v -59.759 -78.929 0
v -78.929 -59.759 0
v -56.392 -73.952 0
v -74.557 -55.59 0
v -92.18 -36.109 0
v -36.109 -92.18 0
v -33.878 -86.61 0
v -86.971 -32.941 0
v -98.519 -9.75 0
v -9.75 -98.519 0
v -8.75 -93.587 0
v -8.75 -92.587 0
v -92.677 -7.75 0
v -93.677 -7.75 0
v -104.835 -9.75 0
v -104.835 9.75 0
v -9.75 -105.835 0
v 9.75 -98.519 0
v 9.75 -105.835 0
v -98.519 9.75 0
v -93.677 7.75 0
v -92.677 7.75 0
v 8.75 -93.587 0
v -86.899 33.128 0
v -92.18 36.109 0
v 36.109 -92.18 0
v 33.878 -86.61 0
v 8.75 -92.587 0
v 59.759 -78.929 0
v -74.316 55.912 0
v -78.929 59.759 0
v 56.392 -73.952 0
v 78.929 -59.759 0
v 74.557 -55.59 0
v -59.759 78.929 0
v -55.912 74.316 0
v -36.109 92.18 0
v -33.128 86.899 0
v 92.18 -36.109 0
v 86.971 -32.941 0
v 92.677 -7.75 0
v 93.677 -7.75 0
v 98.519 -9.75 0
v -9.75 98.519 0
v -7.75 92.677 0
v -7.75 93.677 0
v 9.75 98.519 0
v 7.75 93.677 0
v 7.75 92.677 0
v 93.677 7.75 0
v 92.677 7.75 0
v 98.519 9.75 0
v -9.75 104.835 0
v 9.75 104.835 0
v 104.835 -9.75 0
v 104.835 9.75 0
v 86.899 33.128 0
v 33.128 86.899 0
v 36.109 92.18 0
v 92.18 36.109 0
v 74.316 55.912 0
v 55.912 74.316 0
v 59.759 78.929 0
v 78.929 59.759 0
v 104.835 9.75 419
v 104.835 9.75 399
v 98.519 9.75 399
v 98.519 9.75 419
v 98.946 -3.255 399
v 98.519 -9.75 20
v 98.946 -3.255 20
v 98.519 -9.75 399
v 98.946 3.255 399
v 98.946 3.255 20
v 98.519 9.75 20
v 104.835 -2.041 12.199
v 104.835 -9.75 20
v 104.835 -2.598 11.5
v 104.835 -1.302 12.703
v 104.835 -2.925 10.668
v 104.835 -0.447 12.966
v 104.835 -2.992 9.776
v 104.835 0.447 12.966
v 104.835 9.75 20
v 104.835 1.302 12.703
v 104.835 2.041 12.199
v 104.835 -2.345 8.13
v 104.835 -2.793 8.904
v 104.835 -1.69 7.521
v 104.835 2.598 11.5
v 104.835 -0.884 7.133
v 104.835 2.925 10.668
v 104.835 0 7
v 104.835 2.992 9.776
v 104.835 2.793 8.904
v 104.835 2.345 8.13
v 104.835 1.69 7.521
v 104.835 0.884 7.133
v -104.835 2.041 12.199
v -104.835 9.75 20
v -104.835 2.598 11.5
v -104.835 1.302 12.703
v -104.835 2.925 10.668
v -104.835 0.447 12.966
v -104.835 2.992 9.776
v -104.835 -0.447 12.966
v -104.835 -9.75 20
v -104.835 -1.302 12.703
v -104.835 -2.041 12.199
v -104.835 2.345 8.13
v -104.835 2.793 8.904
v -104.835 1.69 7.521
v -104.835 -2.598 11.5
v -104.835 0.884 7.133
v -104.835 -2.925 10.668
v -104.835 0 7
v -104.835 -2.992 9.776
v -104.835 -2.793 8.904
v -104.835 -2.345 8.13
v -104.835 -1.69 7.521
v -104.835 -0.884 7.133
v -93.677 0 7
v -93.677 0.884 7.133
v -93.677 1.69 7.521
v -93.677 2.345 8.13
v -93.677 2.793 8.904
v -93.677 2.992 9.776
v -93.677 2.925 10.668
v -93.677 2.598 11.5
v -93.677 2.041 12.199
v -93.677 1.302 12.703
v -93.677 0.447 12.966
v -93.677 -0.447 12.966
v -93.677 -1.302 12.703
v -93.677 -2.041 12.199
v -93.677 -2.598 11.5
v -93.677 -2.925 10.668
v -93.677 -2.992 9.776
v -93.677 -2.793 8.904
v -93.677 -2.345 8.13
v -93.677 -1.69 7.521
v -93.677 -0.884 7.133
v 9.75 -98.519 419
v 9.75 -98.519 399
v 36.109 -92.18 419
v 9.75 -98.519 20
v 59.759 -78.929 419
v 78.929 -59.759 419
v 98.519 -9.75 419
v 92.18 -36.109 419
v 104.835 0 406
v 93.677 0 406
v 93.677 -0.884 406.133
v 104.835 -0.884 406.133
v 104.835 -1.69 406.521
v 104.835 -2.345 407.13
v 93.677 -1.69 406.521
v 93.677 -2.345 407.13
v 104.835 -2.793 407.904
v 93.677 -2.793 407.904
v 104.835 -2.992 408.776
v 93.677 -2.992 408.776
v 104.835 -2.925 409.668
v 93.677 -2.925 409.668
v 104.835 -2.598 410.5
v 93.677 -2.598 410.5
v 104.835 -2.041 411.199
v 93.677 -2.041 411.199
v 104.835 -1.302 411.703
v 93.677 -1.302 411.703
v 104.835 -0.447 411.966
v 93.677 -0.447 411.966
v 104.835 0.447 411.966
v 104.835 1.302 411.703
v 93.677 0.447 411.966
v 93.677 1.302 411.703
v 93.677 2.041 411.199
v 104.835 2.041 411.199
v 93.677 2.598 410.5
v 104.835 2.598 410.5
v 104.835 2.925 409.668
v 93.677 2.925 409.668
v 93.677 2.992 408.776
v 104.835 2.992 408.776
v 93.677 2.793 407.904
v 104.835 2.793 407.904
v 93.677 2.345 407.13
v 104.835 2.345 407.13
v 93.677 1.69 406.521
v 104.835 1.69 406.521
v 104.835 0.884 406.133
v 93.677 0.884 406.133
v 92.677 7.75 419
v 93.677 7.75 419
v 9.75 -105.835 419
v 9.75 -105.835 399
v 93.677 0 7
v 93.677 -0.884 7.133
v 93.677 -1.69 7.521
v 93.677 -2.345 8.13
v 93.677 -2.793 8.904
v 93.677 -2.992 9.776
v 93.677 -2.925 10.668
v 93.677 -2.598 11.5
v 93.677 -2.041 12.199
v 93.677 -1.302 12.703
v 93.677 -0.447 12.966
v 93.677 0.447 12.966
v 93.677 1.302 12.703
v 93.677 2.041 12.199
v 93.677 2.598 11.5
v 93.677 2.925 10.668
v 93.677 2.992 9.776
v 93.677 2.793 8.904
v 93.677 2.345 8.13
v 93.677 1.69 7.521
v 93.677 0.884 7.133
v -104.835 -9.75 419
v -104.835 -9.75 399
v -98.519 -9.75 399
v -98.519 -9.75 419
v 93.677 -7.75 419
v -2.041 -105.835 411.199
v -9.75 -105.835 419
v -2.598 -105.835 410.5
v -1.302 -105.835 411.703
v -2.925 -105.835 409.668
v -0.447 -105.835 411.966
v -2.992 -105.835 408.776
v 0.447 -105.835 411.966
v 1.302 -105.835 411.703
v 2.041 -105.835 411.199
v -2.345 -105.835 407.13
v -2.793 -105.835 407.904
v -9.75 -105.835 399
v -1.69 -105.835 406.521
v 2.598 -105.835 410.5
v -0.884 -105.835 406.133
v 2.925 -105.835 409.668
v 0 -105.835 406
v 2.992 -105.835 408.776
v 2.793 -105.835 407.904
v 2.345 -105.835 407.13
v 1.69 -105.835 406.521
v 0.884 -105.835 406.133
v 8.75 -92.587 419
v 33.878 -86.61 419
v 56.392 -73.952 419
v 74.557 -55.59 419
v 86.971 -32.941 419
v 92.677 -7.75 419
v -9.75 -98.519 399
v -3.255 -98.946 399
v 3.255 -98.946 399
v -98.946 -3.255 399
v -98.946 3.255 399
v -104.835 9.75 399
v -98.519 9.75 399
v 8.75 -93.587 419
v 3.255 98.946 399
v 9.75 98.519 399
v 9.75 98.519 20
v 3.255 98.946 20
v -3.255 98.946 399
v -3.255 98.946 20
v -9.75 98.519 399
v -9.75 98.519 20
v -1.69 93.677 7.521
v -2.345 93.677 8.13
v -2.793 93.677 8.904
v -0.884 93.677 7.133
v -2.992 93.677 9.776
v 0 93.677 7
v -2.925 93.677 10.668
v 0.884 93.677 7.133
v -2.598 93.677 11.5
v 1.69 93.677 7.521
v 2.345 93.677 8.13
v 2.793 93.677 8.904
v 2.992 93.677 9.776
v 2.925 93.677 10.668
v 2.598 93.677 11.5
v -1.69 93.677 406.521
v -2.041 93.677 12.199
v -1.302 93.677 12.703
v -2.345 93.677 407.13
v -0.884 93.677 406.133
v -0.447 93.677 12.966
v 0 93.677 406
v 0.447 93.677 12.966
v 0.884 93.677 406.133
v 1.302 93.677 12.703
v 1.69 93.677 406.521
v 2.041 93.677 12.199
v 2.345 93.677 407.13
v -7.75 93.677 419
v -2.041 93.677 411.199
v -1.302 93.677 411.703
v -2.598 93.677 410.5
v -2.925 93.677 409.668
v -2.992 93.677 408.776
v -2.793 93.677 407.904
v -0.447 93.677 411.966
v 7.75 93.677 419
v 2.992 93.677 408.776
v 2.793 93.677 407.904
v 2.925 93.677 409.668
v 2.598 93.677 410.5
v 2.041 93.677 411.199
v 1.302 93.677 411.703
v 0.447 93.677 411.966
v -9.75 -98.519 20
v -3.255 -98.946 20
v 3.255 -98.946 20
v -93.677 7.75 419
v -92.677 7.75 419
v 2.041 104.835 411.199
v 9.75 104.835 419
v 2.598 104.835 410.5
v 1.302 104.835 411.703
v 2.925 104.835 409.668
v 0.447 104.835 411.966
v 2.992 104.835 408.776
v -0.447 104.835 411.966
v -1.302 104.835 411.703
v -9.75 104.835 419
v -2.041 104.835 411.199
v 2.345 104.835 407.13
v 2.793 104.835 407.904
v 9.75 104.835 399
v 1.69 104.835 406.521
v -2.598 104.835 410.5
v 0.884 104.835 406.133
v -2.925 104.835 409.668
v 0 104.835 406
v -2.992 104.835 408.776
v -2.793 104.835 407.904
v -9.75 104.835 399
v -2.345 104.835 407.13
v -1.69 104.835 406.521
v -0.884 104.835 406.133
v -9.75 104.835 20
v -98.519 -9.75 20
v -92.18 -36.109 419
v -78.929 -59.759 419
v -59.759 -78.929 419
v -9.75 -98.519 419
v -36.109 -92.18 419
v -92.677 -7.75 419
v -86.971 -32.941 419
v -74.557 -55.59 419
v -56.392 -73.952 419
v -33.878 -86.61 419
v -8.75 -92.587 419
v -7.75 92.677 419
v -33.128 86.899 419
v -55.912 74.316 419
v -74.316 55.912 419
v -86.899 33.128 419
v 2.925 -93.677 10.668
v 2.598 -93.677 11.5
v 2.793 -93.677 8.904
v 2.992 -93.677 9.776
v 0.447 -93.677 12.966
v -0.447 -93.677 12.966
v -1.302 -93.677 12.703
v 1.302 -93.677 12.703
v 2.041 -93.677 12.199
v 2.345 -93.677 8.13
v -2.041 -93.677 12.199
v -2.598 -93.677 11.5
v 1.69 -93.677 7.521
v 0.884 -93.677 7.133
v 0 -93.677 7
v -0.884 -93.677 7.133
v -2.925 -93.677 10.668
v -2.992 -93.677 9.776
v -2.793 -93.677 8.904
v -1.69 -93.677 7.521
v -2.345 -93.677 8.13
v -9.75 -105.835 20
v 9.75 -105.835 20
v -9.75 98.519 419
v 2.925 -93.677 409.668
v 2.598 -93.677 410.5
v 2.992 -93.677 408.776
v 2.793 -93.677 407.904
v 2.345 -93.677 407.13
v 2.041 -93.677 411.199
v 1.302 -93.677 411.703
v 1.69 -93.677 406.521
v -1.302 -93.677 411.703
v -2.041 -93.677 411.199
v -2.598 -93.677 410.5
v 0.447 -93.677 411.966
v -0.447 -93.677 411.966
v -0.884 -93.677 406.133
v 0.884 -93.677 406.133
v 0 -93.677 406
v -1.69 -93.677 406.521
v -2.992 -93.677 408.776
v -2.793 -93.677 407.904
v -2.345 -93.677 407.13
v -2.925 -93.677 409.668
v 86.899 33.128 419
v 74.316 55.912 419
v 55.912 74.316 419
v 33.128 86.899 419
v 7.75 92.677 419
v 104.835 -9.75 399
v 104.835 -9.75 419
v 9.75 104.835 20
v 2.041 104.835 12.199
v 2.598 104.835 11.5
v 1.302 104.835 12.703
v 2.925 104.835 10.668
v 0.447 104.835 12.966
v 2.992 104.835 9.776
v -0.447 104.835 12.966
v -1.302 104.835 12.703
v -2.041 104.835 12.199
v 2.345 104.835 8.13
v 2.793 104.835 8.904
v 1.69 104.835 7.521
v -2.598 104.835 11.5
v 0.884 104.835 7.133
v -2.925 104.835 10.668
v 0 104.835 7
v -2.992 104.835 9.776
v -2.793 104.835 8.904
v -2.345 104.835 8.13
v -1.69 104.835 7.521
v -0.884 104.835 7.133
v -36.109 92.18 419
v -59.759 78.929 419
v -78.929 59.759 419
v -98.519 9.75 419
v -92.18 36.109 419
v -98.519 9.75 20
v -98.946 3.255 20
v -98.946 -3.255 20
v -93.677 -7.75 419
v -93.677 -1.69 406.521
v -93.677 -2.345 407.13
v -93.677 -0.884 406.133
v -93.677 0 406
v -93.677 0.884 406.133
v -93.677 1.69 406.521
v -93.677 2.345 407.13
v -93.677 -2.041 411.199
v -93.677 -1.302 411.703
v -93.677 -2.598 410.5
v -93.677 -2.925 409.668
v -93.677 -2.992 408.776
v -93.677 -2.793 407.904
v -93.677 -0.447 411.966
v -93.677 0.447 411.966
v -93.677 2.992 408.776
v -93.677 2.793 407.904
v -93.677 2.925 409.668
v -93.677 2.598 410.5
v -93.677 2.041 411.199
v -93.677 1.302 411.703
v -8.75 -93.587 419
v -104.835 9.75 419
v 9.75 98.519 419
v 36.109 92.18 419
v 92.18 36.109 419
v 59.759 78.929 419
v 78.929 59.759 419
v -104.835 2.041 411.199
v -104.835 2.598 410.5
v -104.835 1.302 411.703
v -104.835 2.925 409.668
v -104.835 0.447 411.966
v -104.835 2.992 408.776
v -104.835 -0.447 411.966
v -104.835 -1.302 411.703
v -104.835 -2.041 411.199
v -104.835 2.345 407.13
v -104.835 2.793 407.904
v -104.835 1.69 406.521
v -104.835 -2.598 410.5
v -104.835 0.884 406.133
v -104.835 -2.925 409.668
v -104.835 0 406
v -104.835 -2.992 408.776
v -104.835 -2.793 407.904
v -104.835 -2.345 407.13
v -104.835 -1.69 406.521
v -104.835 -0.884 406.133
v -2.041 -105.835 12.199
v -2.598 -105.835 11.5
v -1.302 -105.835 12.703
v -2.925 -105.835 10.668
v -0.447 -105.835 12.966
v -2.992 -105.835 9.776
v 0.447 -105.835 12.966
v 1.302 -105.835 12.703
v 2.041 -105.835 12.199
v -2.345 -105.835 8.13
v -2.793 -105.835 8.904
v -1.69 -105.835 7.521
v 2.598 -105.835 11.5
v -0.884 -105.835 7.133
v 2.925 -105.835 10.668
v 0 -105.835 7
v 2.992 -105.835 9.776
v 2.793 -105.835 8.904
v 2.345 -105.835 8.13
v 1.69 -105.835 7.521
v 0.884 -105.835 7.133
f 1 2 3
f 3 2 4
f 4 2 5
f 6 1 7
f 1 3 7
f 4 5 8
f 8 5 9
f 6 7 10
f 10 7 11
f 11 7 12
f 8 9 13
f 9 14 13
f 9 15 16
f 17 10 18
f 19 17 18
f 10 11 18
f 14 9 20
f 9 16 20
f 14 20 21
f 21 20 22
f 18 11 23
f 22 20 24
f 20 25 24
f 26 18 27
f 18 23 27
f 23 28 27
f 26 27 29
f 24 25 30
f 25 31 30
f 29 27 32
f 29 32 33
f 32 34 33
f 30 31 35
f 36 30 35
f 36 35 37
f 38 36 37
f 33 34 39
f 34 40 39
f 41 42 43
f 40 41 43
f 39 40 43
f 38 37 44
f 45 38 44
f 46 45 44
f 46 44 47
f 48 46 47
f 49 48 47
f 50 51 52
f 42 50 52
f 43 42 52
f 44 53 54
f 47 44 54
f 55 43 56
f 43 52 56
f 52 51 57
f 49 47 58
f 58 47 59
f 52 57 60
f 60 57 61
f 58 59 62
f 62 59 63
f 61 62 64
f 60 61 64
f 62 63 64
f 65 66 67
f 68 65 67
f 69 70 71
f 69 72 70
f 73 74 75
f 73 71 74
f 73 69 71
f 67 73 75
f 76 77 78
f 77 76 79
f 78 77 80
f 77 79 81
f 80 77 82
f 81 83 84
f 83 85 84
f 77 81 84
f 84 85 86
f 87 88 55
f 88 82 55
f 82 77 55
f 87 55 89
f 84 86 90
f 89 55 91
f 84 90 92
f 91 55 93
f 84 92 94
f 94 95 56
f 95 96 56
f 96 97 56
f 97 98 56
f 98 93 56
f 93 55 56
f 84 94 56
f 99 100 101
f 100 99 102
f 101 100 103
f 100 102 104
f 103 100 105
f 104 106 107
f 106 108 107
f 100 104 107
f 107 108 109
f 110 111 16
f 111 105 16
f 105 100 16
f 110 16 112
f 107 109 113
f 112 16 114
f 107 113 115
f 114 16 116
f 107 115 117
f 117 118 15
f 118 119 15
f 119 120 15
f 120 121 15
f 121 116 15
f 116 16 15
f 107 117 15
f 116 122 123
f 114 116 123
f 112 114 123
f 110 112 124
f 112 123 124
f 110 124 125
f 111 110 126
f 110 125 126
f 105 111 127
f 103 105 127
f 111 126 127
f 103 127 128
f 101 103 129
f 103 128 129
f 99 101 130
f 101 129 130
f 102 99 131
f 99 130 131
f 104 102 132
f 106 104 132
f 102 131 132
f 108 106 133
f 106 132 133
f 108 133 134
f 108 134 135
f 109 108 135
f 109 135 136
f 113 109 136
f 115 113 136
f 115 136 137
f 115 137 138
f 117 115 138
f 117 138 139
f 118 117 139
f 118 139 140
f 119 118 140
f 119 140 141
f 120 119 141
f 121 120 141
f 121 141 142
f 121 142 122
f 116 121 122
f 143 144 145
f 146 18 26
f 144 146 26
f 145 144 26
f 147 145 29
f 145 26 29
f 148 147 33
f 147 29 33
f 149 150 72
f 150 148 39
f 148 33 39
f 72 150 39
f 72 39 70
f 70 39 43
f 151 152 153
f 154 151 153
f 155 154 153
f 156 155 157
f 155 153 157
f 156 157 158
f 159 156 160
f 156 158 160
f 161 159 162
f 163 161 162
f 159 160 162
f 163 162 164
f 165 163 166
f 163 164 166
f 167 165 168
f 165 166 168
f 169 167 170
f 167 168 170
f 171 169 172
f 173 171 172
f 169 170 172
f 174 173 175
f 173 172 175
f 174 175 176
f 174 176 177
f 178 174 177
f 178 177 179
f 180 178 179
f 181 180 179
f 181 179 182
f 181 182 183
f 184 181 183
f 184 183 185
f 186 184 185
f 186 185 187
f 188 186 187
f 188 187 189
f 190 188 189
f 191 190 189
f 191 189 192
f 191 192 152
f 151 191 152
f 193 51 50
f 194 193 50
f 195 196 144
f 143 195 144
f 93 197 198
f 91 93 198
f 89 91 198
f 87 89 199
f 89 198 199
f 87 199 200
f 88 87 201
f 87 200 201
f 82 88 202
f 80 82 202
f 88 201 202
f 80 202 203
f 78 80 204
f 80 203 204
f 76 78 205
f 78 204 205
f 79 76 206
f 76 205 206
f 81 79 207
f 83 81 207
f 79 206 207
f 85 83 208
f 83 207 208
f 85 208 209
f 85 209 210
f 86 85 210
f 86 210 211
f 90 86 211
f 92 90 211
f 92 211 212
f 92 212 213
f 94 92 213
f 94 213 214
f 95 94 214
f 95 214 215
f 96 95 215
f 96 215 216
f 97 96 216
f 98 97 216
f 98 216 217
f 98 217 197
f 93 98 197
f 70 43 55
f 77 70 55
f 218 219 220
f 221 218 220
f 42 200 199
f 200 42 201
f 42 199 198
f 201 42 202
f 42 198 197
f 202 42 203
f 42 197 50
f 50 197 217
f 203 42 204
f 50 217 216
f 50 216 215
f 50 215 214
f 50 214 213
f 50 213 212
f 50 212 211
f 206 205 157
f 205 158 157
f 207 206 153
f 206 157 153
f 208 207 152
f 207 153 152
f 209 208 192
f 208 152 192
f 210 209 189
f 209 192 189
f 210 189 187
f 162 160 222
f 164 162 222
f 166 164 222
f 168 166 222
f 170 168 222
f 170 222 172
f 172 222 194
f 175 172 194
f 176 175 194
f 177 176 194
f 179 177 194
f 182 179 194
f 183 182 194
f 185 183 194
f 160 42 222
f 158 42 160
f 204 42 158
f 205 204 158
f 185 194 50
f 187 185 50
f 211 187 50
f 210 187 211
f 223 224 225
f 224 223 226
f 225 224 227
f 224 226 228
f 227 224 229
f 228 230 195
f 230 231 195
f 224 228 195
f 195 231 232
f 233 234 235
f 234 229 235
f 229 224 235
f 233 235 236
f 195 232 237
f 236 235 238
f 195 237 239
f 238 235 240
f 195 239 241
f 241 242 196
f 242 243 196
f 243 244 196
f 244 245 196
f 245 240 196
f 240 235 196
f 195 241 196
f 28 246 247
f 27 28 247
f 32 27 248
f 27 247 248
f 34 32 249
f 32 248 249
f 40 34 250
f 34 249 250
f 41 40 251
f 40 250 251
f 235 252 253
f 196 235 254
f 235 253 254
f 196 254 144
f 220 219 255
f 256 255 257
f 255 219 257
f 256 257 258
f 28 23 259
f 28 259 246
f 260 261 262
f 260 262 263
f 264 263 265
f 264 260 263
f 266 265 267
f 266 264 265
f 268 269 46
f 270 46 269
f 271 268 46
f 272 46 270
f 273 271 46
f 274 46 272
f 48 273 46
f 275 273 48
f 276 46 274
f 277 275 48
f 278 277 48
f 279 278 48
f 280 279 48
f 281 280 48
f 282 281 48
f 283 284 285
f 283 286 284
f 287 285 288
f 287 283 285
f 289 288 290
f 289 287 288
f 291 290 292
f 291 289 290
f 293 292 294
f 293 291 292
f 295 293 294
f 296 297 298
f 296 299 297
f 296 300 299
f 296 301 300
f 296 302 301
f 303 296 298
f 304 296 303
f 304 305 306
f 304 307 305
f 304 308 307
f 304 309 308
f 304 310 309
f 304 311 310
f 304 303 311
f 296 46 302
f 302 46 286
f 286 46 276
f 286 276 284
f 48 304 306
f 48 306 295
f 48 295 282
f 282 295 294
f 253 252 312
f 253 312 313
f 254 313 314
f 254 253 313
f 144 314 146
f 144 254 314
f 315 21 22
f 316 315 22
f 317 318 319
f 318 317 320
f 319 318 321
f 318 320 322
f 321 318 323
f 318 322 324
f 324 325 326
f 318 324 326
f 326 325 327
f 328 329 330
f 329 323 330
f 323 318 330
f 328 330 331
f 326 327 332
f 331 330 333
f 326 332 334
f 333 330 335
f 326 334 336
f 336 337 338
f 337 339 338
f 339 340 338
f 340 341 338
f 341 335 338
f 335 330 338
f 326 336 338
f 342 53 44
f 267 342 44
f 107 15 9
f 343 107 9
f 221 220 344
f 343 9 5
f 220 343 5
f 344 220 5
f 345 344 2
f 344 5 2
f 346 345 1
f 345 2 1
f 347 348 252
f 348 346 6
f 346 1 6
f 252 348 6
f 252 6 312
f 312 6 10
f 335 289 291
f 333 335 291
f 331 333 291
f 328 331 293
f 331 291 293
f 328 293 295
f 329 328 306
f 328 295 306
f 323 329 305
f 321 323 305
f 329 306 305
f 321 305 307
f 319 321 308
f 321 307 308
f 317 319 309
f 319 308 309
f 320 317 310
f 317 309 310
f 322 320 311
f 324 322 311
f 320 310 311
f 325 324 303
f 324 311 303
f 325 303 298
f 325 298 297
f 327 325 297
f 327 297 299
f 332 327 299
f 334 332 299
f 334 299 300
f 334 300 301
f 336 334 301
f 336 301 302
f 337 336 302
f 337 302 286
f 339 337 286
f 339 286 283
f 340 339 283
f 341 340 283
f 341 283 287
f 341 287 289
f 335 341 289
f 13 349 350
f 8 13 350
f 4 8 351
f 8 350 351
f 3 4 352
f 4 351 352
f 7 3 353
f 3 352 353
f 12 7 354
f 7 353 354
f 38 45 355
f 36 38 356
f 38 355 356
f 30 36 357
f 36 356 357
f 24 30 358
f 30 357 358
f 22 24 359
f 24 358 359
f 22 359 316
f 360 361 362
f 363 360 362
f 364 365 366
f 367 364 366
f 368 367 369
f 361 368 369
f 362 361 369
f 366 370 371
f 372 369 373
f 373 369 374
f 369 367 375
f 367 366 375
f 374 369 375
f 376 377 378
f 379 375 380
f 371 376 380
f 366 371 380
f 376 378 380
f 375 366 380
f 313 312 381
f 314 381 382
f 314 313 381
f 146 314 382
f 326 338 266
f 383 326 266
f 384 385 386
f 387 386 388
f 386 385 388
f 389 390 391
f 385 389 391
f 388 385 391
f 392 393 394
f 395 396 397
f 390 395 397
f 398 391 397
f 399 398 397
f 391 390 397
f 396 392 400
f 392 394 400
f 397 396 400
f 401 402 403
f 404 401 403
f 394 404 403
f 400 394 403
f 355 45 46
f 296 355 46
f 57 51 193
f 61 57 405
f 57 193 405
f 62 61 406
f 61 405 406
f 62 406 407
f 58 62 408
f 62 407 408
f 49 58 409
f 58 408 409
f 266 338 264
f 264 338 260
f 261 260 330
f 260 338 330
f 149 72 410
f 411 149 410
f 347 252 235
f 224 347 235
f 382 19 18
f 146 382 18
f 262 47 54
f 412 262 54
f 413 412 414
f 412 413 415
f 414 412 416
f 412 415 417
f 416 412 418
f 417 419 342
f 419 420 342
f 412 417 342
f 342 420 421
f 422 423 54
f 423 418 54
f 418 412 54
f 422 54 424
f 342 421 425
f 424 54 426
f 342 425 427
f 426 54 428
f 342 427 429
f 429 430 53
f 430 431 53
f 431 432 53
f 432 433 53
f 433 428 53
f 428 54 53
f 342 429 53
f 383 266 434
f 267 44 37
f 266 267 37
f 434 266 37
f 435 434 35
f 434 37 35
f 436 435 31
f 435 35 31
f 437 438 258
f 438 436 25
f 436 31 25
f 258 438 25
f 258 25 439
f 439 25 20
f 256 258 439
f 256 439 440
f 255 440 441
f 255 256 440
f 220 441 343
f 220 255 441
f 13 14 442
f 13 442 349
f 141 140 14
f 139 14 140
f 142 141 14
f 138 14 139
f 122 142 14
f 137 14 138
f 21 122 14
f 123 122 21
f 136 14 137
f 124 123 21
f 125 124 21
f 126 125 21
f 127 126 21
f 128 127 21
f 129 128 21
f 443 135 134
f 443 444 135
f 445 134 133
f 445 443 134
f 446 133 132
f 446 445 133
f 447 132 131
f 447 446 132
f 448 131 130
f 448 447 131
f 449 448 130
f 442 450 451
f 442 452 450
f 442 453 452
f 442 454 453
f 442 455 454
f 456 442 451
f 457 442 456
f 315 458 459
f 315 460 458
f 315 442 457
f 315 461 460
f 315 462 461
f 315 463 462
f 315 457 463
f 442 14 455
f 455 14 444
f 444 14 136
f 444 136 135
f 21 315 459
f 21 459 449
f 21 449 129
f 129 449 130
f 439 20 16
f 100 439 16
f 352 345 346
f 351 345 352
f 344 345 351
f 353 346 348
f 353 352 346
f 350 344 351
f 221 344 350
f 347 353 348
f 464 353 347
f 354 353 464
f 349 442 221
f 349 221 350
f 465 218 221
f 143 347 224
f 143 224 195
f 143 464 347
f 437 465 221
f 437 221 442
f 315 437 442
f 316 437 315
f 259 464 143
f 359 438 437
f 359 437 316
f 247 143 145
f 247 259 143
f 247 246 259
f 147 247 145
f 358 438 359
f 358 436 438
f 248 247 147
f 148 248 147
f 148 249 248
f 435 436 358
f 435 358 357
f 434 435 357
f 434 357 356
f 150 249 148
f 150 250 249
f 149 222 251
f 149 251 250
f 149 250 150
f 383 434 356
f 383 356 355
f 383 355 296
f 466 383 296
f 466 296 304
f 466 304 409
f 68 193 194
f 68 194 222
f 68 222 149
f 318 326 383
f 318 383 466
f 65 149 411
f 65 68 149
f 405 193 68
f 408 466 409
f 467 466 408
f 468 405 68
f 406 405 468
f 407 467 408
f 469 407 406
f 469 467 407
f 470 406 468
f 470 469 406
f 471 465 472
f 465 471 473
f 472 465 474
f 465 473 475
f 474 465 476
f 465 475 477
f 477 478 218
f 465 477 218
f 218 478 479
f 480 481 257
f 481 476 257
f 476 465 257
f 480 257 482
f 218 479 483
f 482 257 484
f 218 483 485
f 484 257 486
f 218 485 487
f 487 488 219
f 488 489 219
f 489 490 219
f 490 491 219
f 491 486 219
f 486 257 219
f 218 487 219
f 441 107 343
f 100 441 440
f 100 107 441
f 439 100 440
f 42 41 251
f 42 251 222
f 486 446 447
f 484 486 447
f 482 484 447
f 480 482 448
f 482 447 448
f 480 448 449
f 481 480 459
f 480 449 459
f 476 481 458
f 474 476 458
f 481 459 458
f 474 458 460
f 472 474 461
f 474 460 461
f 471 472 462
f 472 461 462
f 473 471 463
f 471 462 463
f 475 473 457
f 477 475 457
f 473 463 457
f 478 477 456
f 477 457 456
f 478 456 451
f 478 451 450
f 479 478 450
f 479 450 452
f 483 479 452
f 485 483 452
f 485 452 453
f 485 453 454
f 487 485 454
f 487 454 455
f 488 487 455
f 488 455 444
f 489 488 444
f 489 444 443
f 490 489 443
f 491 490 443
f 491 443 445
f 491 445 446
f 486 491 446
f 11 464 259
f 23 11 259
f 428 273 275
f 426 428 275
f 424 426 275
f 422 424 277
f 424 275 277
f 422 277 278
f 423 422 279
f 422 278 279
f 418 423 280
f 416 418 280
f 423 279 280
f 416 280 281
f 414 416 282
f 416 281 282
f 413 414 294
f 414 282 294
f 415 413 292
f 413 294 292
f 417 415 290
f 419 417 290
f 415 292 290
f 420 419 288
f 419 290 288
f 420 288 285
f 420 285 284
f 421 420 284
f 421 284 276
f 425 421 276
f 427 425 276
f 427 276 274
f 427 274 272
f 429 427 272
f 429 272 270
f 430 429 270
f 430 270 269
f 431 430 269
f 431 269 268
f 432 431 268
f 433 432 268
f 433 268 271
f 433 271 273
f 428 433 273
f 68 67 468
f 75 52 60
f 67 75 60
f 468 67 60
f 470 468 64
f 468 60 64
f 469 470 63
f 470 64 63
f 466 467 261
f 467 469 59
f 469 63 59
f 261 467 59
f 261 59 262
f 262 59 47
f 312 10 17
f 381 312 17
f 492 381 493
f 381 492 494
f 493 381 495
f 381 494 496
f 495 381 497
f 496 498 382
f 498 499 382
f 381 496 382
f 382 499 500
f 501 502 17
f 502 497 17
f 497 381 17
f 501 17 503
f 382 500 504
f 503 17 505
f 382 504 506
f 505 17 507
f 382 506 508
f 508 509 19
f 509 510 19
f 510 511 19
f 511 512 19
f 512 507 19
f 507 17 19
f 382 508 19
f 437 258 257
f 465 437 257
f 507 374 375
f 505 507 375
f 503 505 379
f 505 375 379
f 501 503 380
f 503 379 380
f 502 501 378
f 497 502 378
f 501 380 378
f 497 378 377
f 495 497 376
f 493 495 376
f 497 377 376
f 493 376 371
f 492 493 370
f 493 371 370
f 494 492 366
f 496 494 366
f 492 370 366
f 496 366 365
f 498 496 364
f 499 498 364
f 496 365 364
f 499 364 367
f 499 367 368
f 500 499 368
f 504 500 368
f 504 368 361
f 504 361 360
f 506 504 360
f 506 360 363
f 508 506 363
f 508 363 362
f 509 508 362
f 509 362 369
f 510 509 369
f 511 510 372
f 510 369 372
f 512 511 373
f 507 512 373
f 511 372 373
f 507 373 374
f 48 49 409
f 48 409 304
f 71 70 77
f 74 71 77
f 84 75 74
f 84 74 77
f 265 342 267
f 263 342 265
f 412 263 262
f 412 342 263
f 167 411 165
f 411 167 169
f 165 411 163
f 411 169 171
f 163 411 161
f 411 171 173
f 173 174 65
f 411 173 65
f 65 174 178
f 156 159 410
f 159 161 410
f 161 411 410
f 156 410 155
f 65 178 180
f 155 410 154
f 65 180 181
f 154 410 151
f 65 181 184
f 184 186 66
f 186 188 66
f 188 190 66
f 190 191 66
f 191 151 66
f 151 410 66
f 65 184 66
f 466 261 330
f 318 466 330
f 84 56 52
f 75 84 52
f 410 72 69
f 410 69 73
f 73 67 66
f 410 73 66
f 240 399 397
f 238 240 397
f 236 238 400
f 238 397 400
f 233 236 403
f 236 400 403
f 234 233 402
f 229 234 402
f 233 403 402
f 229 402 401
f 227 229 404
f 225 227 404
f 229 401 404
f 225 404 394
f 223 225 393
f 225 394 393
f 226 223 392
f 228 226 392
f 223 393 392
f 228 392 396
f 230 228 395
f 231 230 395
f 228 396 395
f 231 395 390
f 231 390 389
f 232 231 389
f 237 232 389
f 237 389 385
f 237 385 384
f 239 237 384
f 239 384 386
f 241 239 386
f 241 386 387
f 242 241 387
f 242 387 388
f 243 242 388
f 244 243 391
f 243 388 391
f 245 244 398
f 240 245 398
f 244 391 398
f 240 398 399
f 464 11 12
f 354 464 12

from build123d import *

# Parameters (mm, degrees)
EXTRUDE_1_DEPTH          = 419
CUT_EXTRUDE_START        = -20
SKETCH_2_R               = 119
SKETCH_2_R_2             = 99
CUT_EXTRUDE_1_DEPTH      = 379
SKETCH_3_R               = 93
CUT_EXTRUDE_2_DEPTH      = 420
SKETCH_4_W               = 17.5
SKETCH_4_H               = 1
SKETCH_4_W_2             = 1
SKETCH_4_H_2             = 15.5
SKETCH_4_W_3             = 15.5
CUT_EXTRUDE_3_DEPTH      = 420
SKETCH_5_R               = 3
CUT_EXTRUDE_4_DEPTH      = 12.158706001
PATTERN_CIRCULAR_1_COUNT = 4


with BuildPart() as part:
    # 草图1 → 凸台-拉伸1 (new body)
    with BuildSketch(Plane.XY):
        with BuildLine():
            Line((-9.75, -98.518716496), (-9.75, -105.83522676))
            Line((-9.75, -105.83522676), (9.75, -105.83522676))
            Line((9.75, -105.83522676), (9.75, -98.518716496))
            ThreePointArc((9.75, -98.518716496), (70.003571337, -70.003571337), (98.518716496, -9.75))
            Line((98.518716496, -9.75), (104.83522676, -9.75))
            Line((104.83522676, -9.75), (104.83522676, 9.75))
            Line((104.83522676, 9.75), (98.518716496, 9.75))
            ThreePointArc((98.518716496, 9.75), (70.003571337, 70.003571337), (9.75, 98.518716496))
            Line((9.75, 98.518716496), (9.75, 104.83522676))
            Line((9.75, 104.83522676), (-9.75, 104.83522676))
            Line((-9.75, 104.83522676), (-9.75, 98.518716496))
            ThreePointArc((-9.75, 98.518716496), (-70.003571337, 70.003571337), (-98.518716496, 9.75))
            Line((-98.518716496, 9.75), (-104.83522676, 9.75))
            Line((-104.83522676, 9.75), (-104.83522676, -9.75))
            Line((-104.83522676, -9.75), (-98.518716496, -9.75))
            ThreePointArc((-98.518716496, -9.75), (-70.003571337, -70.003571337), (-9.75, -98.518716496))
        make_face()
    extrude(amount=EXTRUDE_1_DEPTH)

    # 草图2 → 切除-拉伸1 (cut)
    with BuildSketch(Plane.XY.offset(419).offset(CUT_EXTRUDE_START)):
        Circle(SKETCH_2_R)
        Circle(SKETCH_2_R_2, mode=Mode.SUBTRACT)
    extrude(amount=-CUT_EXTRUDE_1_DEPTH, mode=Mode.SUBTRACT)

    # 草图3 → 切除-拉伸2 (cut, through all)
    with BuildSketch(Plane.XY.offset(419)):
        Circle(SKETCH_3_R)
    extrude(amount=-CUT_EXTRUDE_2_DEPTH, mode=Mode.SUBTRACT)

    # 草图4 → 切除-拉伸3 (cut, through all)
    with BuildSketch(Plane.XY.offset(419)):
        with Locations((0, -93.087458654)):
            Rectangle(SKETCH_4_W, SKETCH_4_H)
        with Locations((-93.176520759, 0)):
            Rectangle(SKETCH_4_W_2, SKETCH_4_H_2)
        with Locations((0, 93.176520759)):
            Rectangle(SKETCH_4_W_3, SKETCH_4_H)
        with Locations((93.176520759, 0)):
            Rectangle(SKETCH_4_W_2, SKETCH_4_H_2)
    extrude(amount=-CUT_EXTRUDE_3_DEPTH, mode=Mode.SUBTRACT)

    # 草图5 → 切除-拉伸4 (cut, through all)
    with BuildSketch(Plane(origin=(-93.676520759, 0, 0), x_dir=(0, 0, -1), z_dir=(1, 0, 0))):
        with Locations((-409, 0)):
            Circle(SKETCH_5_R)
        with Locations((-10, 0)):
            Circle(SKETCH_5_R)
    cut_extrude_4 = extrude(amount=-CUT_EXTRUDE_4_DEPTH, mode=Mode.SUBTRACT)

    # 阵列(圆周)1: 切除-拉伸4 ×4 about axis
    pattern_circular_1_axis = Axis((0, 0, 1000), (0, 0, -1))
    for i in range(1, PATTERN_CIRCULAR_1_COUNT):
        add(cut_extrude_4.rotate(pattern_circular_1_axis, i * 360 / PATTERN_CIRCULAR_1_COUNT), mode=Mode.SUBTRACT)


solid = part.part
